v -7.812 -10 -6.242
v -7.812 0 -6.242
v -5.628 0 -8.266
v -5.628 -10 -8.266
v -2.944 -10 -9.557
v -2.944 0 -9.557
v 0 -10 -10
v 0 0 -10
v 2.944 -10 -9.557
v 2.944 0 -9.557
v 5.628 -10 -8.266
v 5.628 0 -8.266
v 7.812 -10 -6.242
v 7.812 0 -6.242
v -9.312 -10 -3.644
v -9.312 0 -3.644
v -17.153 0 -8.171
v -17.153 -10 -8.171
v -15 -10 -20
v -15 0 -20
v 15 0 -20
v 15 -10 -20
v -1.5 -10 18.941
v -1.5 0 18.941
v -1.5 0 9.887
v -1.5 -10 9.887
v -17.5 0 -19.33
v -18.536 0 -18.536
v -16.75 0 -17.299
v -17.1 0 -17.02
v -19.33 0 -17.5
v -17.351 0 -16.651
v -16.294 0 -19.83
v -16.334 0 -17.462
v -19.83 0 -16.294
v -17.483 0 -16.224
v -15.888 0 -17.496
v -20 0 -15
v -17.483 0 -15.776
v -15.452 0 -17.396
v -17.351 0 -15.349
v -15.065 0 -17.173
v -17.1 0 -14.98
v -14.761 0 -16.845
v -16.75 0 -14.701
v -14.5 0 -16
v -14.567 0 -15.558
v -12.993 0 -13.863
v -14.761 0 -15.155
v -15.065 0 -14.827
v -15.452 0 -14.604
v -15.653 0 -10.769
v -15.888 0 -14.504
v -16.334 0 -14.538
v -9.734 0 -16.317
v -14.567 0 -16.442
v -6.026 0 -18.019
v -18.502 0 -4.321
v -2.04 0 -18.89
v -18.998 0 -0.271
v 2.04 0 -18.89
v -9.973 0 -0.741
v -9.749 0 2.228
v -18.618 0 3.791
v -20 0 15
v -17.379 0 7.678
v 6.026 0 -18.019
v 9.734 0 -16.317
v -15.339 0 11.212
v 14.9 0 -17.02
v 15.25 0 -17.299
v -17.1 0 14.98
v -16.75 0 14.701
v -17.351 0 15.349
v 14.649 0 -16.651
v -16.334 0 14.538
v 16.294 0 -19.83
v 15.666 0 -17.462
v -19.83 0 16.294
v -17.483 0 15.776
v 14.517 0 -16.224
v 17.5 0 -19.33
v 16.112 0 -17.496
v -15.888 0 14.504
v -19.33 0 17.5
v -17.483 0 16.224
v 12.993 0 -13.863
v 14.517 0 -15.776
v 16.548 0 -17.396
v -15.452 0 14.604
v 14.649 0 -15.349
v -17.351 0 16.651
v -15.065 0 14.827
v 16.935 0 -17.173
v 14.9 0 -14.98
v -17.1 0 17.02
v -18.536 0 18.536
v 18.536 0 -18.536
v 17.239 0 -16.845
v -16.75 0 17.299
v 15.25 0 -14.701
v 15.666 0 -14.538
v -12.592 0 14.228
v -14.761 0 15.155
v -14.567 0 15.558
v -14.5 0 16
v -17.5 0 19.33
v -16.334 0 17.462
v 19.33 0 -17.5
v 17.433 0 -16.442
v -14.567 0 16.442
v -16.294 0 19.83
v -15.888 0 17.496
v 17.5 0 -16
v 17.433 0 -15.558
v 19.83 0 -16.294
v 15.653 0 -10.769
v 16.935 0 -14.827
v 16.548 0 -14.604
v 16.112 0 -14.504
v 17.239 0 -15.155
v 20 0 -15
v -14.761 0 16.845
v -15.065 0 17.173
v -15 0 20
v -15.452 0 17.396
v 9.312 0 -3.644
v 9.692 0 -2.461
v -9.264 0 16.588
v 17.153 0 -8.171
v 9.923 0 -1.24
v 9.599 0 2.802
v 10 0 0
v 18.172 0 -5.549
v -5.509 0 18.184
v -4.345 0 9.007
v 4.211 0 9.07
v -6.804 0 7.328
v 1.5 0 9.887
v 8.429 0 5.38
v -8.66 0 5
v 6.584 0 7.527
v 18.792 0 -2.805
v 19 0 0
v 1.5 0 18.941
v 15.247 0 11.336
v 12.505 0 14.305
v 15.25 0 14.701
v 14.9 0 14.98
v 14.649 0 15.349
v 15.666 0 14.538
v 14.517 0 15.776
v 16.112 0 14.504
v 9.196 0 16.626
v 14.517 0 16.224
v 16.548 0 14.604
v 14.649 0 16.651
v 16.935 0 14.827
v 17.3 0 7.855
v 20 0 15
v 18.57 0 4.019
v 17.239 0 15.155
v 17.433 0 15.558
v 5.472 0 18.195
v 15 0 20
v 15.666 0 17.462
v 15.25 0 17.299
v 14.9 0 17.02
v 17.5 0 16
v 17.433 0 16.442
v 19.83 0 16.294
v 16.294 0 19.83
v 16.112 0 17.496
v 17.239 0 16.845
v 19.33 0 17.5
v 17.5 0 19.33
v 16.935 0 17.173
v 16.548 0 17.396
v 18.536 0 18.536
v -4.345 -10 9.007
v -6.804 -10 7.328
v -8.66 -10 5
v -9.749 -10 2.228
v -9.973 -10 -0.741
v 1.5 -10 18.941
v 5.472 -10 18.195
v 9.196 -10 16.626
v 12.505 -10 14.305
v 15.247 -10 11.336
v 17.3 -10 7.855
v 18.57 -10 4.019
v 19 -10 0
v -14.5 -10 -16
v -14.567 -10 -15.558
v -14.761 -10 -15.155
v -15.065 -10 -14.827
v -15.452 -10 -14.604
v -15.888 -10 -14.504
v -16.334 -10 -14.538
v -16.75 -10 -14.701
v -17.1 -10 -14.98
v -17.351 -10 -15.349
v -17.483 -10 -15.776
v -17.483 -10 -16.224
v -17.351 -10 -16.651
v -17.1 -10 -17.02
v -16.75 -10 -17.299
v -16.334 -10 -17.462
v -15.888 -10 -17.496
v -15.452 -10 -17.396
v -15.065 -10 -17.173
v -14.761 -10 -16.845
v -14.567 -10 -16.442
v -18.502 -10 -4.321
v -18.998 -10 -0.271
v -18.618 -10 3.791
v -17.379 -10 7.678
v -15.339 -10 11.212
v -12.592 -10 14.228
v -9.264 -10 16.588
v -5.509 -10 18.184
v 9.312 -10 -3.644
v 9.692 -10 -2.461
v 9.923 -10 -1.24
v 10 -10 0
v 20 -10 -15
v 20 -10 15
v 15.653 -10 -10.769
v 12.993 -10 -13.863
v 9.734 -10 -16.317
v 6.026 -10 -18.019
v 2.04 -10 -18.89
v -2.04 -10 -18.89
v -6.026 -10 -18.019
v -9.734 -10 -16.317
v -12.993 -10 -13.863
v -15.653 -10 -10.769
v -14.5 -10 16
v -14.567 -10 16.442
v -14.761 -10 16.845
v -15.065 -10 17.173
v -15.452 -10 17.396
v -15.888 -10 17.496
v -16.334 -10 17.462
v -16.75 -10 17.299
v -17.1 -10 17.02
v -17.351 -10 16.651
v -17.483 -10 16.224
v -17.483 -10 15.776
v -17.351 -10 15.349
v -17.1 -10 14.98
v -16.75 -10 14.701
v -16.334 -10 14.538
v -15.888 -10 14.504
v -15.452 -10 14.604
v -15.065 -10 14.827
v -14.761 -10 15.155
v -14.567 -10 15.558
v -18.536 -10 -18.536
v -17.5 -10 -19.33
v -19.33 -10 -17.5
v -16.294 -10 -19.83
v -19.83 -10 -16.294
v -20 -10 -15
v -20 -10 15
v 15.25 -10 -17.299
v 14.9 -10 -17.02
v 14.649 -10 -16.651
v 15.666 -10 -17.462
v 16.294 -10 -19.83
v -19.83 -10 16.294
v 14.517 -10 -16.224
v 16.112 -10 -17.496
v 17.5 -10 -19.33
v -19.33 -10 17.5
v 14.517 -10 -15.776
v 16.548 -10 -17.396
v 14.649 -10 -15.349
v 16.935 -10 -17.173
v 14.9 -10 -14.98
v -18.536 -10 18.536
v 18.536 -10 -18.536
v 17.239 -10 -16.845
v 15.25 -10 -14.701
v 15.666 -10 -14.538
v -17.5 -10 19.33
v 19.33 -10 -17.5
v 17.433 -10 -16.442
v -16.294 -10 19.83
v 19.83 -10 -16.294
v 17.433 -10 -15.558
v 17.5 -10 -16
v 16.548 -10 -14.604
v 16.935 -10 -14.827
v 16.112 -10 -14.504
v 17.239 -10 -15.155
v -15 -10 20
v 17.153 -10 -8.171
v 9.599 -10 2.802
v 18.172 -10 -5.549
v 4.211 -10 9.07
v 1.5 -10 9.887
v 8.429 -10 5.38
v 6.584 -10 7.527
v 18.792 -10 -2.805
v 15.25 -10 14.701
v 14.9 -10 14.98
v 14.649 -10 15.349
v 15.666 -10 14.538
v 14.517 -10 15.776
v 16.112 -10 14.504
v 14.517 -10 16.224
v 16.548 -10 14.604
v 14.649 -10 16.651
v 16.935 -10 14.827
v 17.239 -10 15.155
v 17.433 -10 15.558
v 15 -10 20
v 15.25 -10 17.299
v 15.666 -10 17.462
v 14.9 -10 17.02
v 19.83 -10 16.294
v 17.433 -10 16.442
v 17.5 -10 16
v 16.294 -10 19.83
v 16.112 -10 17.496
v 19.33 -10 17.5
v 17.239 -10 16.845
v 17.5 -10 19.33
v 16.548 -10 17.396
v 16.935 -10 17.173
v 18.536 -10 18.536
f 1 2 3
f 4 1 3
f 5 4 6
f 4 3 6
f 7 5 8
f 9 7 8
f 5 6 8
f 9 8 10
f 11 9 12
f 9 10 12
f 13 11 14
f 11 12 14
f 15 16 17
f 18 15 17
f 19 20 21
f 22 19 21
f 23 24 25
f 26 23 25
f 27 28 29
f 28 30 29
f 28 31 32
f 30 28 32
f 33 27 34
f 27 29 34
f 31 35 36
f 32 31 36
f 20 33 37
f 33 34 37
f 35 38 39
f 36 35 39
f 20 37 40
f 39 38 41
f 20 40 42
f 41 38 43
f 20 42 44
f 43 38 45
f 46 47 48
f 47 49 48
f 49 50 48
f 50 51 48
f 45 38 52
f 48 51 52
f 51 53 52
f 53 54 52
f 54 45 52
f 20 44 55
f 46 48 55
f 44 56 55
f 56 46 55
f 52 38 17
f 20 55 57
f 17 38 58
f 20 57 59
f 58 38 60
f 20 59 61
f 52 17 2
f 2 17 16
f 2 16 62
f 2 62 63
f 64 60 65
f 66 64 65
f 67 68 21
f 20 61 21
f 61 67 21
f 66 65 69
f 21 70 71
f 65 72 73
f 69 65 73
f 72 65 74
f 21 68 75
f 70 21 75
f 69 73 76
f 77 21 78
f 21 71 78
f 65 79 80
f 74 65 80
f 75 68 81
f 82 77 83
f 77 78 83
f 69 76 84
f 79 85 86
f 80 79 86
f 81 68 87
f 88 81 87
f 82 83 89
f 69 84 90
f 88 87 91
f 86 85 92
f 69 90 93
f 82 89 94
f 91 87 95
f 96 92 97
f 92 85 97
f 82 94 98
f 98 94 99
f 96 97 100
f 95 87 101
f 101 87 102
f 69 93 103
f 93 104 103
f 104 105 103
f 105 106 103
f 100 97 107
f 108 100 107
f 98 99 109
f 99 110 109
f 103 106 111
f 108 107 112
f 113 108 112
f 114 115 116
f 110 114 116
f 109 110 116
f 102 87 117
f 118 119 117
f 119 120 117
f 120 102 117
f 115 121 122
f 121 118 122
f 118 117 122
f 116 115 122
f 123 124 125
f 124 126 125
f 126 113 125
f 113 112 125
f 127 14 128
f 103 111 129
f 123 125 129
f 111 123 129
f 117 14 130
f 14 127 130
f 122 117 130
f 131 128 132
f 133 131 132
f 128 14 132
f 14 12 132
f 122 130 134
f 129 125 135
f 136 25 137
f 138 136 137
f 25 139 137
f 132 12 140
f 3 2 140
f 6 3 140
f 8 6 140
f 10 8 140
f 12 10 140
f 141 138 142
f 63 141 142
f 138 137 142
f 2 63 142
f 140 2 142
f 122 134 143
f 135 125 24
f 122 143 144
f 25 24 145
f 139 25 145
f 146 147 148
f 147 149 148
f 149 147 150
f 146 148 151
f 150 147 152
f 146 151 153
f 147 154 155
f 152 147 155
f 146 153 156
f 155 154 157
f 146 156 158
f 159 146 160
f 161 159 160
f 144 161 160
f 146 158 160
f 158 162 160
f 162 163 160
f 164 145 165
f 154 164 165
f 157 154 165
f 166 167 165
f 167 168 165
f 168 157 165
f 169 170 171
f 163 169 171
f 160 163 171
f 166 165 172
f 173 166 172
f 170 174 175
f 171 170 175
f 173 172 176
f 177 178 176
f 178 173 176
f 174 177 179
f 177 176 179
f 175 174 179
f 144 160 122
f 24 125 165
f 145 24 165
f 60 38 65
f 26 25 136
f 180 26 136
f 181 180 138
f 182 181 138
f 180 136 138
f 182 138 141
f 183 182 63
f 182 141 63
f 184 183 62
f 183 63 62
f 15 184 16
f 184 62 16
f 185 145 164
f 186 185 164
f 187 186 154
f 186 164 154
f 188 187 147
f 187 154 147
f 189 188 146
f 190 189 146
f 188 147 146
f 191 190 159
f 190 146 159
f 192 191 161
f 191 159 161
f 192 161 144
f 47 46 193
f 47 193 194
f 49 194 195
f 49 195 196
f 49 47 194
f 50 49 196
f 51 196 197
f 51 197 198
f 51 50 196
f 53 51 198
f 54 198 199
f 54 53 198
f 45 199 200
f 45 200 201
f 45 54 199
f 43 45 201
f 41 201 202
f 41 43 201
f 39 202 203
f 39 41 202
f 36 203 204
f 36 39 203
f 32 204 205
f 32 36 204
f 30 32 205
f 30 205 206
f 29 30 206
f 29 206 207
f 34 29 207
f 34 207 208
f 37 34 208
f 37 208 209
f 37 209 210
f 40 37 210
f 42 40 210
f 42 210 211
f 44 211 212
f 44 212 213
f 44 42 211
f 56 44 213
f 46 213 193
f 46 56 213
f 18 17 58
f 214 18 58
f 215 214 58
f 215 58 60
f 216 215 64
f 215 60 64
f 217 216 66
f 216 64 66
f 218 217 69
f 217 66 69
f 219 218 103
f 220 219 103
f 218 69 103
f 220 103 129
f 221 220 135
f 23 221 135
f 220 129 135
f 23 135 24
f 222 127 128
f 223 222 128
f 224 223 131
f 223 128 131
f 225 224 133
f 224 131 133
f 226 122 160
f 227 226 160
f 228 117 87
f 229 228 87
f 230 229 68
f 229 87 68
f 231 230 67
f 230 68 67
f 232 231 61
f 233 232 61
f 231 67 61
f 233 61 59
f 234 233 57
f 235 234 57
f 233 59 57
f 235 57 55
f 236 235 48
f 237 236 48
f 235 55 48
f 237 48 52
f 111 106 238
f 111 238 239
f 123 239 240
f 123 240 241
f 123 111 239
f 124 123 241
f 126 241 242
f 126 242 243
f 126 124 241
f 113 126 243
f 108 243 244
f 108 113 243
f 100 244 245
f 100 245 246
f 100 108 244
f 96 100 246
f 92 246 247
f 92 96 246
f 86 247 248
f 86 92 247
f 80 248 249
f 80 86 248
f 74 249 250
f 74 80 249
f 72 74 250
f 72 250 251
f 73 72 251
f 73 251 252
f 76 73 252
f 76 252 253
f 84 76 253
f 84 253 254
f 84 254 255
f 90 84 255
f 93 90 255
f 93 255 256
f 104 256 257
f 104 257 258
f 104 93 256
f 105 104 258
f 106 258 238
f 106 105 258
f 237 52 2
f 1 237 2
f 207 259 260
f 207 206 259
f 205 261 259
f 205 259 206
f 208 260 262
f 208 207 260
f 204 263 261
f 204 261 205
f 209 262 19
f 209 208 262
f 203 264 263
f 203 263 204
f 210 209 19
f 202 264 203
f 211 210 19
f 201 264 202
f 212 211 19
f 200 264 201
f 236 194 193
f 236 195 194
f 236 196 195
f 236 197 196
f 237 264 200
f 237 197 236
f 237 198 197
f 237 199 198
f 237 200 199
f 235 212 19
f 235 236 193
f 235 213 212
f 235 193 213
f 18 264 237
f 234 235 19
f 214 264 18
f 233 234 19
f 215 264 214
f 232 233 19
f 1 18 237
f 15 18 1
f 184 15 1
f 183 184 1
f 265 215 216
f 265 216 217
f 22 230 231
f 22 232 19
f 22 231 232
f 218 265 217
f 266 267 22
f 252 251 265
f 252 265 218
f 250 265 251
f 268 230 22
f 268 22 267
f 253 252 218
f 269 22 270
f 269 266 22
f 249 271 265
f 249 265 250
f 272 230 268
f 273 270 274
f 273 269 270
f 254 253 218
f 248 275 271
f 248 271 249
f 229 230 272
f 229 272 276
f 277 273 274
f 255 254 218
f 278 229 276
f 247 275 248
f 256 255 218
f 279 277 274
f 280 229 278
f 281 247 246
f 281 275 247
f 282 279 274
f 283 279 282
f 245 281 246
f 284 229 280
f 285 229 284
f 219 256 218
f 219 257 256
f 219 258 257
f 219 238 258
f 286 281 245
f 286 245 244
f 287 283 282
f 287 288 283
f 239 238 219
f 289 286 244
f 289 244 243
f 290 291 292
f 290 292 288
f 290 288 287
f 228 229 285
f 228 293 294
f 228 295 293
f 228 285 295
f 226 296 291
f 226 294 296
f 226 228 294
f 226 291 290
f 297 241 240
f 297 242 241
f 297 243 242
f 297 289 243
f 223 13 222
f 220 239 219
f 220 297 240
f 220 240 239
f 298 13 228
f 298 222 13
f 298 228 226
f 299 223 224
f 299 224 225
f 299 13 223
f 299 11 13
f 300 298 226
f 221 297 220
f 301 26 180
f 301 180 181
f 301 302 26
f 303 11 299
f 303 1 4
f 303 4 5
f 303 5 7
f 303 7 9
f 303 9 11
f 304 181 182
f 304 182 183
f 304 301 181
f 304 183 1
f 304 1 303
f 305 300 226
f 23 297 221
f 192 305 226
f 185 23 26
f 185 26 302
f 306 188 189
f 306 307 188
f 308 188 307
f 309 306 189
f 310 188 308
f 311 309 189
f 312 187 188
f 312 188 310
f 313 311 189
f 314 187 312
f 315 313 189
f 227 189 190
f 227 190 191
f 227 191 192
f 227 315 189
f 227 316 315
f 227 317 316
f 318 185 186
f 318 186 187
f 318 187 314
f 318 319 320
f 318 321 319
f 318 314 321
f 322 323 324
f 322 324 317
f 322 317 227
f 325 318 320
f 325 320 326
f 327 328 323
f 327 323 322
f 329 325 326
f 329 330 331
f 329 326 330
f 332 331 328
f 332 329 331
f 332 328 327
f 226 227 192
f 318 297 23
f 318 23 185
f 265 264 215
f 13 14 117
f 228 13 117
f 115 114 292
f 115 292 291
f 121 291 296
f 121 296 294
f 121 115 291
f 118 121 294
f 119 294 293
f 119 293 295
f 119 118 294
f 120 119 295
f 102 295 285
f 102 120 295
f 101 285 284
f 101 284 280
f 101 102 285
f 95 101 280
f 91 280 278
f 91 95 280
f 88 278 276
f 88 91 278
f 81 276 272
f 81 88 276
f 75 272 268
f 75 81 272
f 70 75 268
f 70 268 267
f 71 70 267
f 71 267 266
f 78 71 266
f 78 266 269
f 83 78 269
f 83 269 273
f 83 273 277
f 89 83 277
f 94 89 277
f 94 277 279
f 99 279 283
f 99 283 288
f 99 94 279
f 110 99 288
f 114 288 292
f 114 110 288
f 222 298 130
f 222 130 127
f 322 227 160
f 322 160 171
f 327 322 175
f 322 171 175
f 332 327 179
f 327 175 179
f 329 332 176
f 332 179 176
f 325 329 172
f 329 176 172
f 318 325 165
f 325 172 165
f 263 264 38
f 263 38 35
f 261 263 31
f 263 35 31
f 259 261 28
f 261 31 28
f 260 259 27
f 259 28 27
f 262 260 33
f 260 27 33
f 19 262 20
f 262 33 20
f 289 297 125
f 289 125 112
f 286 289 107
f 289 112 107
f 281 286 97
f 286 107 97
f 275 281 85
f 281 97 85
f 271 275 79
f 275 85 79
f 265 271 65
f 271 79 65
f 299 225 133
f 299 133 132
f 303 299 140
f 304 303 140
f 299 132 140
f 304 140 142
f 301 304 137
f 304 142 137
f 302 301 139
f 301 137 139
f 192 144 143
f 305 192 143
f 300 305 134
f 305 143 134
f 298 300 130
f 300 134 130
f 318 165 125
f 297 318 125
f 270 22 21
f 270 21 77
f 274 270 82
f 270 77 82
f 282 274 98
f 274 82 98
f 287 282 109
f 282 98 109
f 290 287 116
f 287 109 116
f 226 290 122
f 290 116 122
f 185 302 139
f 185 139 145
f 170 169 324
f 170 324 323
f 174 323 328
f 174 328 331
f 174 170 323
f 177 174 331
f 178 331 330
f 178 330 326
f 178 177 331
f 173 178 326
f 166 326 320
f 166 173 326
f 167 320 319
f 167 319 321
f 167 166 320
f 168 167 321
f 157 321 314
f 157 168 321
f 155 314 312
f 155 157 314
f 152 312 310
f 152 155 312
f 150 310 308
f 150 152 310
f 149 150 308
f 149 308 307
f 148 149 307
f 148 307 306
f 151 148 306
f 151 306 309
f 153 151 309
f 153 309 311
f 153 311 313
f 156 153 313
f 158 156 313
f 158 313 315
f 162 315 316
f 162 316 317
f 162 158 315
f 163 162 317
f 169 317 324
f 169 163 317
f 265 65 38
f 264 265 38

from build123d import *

# Parameters (mm, degrees)
F0_R     = 1.5
F1_DEPTH = 10


with BuildPart() as f1:
    # F0 (on Front) → F1 (new body)
    with BuildSketch(Plane.XZ):
        with BuildLine():
            Line((-15, -20), (15, -20))
            ThreePointArc((15, -20), (18.535534, -18.535534), (20, -15))
            Line((20, -15), (20, 15))
            ThreePointArc((20, 15), (18.535534, 18.535534), (15, 20))
            Line((15, 20), (-15, 20))
            ThreePointArc((-15, 20), (-18.535534, 18.535534), (-20, 15))
            Line((-20, 15), (-20, -15))
            ThreePointArc((-20, -15), (-18.535534, -18.535534), (-15, -20))
        make_face()
        with Locations((-16, -16)):
            Circle(F0_R, mode=Mode.SUBTRACT)
        with Locations((16, -16)):
            Circle(F0_R, mode=Mode.SUBTRACT)
        with Locations((-16, 16)):
            Circle(F0_R, mode=Mode.SUBTRACT)
        with BuildLine():
            ThreePointArc((1.5, 18.940697), (13.955286, 12.893797), (19, 0))
            ThreePointArc((19, 0), (18.53253, -4.188713), (17.153125, -8.17131))
            ThreePointArc((17.153125, -8.17131), (16.454483, -9.5), (15.653125, -10.769387))
            ThreePointArc((15.653125, -10.769387), (0, -19), (-15.653125, -10.769387))
            ThreePointArc((-15.653125, -10.769387), (-16.454483, -9.5), (-17.153125, -8.17131))
            ThreePointArc((-17.153125, -8.17131), (-16.454483, 9.5), (-1.5, 18.940697))
            ThreePointArc((-1.5, 18.940697), (0, 19), (1.5, 18.940697))
        make_face(mode=Mode.SUBTRACT)
        with Locations((16, 16)):
            Circle(F0_R, mode=Mode.SUBTRACT)
        with BuildLine():
            Line((1.5, 9.88686), (1.5, 18.940697))
            ThreePointArc((1.5, 18.940697), (0, 19), (-1.5, 18.940697))
            Line((-1.5, 18.940697), (-1.5, 9.88686))
            ThreePointArc((-1.5, 9.88686), (0, 10), (1.5, 9.88686))
        make_face()
        with BuildLine():
            Line((-9.312272, -3.644392), (-17.153125, -8.17131))
            ThreePointArc((-17.153125, -8.17131), (-16.454483, -9.5), (-15.653125, -10.769387))
            Line((-15.653125, -10.769387), (-7.812272, -6.242468))
            ThreePointArc((-7.812272, -6.242468), (-8.660254, -5), (-9.312272, -3.644392))
        make_face()
        with BuildLine():
            ThreePointArc((15.653125, -10.769387), (16.454483, -9.5), (17.153125, -8.17131))
            Line((17.153125, -8.17131), (9.312272, -3.644392))
            ThreePointArc((9.312272, -3.644392), (8.660254, -5), (7.812272, -6.242468))
            Line((7.812272, -6.242468), (15.653125, -10.769387))
        make_face()
        with BuildLine():
            ThreePointArc((10, 0), (7.582875, 6.519202), (1.5, 9.88686))
            ThreePointArc((1.5, 9.88686), (0, 10), (-1.5, 9.88686))
            ThreePointArc((-1.5, 9.88686), (-8.660254, 5), (-9.312272, -3.644392))
            ThreePointArc((-9.312272, -3.644392), (-8.660254, -5), (-7.812272, -6.242468))
            ThreePointArc((-7.812272, -6.242468), (0, -10), (7.812272, -6.242468))
            ThreePointArc((7.812272, -6.242468), (8.660254, -5), (9.312272, -3.644392))
            ThreePointArc((9.312272, -3.644392), (9.826564, -1.854357), (10, 0))
        make_face()
    extrude(amount=F1_DEPTH)


solid = f1.part
